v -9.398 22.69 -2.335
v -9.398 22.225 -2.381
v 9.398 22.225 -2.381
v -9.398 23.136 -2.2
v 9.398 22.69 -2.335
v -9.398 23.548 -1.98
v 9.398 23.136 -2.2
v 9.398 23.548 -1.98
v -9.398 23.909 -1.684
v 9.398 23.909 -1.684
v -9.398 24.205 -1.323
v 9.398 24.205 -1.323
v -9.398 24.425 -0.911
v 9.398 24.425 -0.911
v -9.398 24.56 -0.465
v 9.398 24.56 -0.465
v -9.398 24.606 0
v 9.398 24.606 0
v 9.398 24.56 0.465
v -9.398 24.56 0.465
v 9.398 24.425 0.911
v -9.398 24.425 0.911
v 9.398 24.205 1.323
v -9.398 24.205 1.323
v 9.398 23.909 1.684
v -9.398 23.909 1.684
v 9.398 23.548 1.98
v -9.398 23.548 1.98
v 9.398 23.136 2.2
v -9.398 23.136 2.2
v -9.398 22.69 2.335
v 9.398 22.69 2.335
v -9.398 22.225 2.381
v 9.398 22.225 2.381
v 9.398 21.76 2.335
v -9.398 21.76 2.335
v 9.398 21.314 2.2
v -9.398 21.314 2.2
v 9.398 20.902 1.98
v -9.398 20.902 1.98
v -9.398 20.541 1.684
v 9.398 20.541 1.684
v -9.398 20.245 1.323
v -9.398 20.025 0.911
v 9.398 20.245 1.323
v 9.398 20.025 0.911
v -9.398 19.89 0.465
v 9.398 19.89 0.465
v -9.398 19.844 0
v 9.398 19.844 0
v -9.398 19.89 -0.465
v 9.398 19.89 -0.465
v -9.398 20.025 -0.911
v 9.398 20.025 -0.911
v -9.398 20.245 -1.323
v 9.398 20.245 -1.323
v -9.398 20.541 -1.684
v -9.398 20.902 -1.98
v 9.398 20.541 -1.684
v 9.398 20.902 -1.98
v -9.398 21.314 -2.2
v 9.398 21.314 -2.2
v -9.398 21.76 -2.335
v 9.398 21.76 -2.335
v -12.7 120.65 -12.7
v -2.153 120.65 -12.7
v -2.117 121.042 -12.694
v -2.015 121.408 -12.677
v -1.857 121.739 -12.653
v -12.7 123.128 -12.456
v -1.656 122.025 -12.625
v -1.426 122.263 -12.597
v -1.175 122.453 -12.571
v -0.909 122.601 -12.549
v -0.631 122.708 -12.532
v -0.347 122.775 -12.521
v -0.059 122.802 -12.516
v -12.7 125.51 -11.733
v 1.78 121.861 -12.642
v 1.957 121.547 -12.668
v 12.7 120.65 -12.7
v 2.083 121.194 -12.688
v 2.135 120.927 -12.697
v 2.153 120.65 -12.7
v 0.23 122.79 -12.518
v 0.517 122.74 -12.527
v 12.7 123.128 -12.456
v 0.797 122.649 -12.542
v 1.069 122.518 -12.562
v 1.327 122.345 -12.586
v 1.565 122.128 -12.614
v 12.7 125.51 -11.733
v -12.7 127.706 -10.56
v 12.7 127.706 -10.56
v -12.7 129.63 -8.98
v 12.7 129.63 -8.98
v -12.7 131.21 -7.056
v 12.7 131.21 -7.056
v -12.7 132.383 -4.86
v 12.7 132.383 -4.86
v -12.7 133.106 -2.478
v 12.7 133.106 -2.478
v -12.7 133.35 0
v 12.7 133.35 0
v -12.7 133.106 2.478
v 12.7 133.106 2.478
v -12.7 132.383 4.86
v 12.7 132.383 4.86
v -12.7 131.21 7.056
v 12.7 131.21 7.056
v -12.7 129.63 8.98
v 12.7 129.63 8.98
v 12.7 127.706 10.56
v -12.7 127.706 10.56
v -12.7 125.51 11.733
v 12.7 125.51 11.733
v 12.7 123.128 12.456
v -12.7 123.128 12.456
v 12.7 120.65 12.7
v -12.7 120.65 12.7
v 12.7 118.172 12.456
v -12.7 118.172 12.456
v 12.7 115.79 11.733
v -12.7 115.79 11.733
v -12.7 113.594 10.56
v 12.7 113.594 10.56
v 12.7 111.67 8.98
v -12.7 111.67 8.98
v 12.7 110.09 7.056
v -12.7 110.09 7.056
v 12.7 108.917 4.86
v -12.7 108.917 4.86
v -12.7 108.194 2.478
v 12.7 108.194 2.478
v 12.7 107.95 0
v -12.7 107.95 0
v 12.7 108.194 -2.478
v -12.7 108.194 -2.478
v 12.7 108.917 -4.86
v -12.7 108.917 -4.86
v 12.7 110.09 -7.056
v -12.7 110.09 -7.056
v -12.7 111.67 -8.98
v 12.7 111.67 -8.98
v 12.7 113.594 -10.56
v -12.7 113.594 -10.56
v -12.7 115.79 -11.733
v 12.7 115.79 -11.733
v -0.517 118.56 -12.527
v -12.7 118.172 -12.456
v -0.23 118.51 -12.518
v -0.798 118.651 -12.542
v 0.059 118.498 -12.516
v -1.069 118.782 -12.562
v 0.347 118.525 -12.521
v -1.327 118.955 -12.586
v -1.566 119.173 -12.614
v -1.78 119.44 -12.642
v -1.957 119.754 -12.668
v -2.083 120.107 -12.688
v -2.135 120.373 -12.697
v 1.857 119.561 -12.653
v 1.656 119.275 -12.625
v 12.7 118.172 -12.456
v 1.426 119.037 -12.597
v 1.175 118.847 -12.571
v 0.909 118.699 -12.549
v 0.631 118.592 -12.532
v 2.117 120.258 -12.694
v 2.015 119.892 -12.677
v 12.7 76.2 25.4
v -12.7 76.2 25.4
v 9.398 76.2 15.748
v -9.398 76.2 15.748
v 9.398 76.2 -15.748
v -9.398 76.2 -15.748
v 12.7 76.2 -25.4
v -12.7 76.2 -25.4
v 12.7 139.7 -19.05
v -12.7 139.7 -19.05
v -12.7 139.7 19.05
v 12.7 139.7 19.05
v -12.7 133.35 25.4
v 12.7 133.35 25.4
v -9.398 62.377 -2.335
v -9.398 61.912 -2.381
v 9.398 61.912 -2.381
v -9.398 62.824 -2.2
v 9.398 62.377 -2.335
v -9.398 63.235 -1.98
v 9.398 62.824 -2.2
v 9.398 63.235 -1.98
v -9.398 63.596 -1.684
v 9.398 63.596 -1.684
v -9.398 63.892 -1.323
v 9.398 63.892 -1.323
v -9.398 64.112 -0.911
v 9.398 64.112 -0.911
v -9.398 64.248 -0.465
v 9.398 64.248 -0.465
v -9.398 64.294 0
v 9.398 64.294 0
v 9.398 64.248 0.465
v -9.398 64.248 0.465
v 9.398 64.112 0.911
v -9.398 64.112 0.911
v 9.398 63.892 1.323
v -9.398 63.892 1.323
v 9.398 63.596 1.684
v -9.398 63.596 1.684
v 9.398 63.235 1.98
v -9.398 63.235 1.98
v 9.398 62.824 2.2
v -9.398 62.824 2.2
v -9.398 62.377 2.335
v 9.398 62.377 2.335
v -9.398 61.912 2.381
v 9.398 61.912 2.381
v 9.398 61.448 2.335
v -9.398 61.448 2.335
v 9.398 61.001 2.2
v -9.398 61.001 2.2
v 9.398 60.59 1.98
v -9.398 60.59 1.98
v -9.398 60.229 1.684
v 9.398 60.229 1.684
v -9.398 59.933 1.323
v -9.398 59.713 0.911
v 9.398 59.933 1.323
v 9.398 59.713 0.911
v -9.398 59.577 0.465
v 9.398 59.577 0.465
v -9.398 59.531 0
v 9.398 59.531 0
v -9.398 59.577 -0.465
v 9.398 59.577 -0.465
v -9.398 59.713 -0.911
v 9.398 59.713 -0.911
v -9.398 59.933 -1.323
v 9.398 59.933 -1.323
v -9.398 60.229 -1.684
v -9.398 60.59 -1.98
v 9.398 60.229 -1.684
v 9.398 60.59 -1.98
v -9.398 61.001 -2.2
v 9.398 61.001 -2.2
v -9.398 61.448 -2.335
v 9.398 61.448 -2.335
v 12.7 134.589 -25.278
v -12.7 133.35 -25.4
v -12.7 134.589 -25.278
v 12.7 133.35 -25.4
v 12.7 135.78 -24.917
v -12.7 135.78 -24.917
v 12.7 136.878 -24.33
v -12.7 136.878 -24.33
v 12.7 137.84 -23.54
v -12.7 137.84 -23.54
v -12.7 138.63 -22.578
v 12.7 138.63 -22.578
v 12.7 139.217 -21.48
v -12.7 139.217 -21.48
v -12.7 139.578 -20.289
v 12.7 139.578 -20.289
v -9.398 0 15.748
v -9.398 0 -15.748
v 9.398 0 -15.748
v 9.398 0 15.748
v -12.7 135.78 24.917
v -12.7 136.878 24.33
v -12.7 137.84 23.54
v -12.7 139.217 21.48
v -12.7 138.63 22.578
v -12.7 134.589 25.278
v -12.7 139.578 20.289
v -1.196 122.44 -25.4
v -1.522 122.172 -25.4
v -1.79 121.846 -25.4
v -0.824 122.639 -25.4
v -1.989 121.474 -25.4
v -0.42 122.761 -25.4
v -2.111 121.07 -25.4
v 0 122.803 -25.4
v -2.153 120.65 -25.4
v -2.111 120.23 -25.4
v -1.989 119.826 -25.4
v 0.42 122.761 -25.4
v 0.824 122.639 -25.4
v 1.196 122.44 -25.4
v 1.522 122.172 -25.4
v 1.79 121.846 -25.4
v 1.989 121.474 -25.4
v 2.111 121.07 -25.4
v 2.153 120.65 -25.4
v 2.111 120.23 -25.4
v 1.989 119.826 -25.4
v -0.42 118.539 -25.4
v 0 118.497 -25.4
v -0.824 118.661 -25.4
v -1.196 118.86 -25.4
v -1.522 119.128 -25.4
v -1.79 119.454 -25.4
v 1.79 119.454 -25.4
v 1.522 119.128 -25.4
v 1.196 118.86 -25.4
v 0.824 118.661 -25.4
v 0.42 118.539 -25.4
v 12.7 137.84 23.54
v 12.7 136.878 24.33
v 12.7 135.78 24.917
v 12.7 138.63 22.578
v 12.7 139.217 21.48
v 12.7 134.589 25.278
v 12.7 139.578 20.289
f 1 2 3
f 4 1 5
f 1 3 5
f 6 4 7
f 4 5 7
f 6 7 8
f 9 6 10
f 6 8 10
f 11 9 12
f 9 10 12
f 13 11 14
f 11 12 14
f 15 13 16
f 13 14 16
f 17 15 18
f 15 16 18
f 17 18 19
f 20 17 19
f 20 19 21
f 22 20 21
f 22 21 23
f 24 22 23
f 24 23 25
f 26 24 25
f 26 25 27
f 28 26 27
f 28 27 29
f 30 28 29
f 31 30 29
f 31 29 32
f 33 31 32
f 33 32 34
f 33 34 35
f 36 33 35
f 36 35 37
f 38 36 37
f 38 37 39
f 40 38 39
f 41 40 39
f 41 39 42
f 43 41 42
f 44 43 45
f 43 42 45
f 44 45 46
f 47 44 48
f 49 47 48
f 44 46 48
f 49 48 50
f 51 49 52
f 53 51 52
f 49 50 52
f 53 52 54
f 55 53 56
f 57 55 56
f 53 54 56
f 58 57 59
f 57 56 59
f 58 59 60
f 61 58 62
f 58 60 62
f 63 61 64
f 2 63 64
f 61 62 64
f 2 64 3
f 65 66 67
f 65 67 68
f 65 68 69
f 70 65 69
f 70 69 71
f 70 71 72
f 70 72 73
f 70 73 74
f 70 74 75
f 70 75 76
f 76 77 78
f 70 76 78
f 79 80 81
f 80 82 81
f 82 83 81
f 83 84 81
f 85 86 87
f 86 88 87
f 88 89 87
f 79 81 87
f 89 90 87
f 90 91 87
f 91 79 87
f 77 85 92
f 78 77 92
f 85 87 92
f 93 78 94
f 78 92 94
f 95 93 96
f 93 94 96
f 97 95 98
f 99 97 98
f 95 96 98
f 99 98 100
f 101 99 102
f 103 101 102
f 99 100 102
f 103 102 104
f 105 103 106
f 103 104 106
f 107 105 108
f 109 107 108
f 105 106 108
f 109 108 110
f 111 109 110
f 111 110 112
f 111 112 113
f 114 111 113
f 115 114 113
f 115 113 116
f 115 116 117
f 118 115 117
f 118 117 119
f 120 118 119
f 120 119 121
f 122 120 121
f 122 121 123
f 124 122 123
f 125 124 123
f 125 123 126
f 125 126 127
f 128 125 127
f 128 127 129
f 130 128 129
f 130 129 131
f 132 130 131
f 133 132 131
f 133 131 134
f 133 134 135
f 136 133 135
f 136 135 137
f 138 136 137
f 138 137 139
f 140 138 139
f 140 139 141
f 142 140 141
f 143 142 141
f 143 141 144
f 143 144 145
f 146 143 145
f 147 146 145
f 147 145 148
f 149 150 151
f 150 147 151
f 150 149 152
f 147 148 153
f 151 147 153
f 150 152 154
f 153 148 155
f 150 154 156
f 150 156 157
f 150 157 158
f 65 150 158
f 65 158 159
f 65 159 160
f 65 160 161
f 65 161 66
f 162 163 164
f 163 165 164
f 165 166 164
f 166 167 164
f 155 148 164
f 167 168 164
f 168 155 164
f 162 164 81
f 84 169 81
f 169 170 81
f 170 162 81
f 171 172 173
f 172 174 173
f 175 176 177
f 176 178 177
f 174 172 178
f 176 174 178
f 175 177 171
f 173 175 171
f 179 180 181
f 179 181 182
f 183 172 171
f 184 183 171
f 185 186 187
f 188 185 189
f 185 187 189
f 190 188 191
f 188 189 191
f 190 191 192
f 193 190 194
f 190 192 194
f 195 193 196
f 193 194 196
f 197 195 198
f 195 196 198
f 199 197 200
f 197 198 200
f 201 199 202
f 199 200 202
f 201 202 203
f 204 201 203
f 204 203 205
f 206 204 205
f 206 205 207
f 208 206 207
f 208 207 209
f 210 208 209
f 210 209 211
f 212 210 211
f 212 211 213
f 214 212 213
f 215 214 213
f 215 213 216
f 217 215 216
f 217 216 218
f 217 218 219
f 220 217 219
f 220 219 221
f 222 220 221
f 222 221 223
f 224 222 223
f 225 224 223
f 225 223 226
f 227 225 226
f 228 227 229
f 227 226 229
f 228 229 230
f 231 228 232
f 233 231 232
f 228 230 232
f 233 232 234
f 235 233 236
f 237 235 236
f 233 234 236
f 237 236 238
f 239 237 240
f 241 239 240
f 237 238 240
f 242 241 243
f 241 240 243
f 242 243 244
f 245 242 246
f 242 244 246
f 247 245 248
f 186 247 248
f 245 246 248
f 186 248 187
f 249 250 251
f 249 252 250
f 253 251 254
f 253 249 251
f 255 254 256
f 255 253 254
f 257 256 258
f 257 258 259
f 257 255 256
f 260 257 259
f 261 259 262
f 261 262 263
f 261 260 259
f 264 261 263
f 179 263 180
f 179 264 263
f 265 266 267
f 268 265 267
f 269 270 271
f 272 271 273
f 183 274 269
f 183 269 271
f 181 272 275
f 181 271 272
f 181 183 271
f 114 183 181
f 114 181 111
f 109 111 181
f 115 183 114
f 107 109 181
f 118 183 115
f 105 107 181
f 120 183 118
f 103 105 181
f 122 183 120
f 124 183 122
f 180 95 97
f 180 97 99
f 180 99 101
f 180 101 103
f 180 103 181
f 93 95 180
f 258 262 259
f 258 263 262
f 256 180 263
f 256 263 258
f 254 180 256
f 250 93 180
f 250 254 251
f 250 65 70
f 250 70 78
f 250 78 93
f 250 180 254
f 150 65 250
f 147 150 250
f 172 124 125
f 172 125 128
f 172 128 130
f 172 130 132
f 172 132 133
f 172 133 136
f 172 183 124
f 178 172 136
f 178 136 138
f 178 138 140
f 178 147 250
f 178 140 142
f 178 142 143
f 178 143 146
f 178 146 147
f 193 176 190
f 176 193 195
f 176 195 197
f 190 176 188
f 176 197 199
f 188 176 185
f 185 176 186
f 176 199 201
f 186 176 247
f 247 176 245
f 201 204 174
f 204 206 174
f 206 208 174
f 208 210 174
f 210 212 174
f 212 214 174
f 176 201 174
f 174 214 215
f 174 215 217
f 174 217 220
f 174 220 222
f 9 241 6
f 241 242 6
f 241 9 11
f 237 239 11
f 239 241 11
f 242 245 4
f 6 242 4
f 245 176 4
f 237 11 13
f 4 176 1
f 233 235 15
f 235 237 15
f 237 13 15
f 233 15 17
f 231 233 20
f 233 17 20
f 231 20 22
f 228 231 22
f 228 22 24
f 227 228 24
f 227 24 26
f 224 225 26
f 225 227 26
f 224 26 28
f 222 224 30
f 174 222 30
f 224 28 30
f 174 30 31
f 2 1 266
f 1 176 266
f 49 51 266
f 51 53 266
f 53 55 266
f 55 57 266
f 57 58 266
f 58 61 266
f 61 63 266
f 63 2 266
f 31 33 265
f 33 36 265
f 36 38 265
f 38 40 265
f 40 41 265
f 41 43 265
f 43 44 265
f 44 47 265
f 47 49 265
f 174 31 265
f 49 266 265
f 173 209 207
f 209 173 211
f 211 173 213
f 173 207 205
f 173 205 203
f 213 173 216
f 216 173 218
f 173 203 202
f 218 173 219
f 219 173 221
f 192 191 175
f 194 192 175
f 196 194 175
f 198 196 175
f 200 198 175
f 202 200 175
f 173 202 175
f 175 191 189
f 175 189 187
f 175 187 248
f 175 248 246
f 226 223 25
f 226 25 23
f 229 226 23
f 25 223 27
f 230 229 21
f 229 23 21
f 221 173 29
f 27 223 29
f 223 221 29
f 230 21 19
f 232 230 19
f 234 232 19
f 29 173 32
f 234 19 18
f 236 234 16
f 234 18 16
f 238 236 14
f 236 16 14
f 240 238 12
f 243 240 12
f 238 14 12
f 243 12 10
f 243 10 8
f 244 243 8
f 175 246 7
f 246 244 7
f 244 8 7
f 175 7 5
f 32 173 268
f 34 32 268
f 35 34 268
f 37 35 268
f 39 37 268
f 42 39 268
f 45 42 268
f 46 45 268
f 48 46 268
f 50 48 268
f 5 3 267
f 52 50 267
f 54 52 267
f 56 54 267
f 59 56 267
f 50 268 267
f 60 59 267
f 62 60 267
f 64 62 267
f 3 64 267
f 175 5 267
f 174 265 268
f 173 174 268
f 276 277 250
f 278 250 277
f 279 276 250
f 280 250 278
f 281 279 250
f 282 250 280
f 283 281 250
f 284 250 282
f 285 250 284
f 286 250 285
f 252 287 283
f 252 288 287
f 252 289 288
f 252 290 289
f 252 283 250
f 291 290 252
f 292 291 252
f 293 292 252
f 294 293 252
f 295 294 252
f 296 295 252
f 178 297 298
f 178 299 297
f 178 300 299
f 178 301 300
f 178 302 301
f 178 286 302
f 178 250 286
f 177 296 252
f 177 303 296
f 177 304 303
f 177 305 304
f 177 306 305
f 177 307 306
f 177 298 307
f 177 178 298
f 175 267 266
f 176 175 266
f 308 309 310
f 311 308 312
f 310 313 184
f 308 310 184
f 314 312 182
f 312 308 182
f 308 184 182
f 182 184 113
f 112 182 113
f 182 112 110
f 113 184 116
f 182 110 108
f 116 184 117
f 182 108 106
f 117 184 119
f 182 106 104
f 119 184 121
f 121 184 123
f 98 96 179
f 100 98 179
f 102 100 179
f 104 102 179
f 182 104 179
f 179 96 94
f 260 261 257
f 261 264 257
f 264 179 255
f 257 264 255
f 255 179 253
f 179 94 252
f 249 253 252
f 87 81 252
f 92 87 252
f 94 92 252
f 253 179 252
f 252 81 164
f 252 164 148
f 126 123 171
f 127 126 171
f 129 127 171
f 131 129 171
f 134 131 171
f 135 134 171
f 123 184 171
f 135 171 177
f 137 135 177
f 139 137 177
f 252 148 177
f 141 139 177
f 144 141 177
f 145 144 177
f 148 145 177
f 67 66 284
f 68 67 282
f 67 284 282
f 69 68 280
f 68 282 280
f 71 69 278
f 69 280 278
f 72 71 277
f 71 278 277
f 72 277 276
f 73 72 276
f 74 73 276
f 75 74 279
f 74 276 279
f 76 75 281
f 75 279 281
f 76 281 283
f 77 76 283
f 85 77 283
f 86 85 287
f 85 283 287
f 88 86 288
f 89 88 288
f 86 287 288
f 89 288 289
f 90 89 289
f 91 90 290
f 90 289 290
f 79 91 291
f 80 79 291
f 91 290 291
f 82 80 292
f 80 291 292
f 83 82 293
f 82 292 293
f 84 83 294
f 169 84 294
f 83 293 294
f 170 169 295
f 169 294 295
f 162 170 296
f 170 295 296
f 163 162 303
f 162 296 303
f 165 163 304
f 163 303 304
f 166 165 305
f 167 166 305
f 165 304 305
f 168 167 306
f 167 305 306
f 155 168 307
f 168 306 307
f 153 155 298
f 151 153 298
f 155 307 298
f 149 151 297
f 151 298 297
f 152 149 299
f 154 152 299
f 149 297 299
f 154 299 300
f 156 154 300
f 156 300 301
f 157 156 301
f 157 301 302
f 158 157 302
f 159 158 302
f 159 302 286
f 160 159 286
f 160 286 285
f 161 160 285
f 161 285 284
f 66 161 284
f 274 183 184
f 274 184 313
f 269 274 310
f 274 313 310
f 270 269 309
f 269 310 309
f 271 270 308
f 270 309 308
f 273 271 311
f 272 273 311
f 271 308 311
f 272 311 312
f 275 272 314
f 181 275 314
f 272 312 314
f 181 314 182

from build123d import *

# Parameters (mm, degrees)
SKETCH2_W               = 20.828
SKETCH2_H               = 33.528
BOSS_EXTRUDE1_DEPTH     = 76.2
SKETCH3_W               = 25.4
SKETCH3_H               = 50.8
BOSS_EXTRUDE2_DEPTH     = 63.5
FILLET1_R               = 6.35
SKETCH4_R               = 12.7
CUT_EXTRUDE1_DEPTH      = 145.244271983
CUT_EXTRUDE2_REACH      = 151.191
CUT_EXTRUDE2_END_RADIUS = 12.7
SKETCH5_R               = 2.15265
SKETCH6_W               = 20.828
SKETCH6_H               = 33.528
CUT_EXTRUDE3_DEPTH      = 76.2
SKETCH7_R               = 2.38125
CUT_EXTRUDE4_DEPTH      = 78.74


with BuildPart() as part:
    # Sketch2 → Boss-Extrude1 (new body)
    with BuildSketch(Plane(origin=(0, 0, 0), x_dir=(1, 0, 0), z_dir=(0, 1, 0))):
        Rectangle(SKETCH2_W, SKETCH2_H)
    extrude(amount=BOSS_EXTRUDE1_DEPTH)

    # Sketch3 → Boss-Extrude2 (add)
    with BuildSketch(Plane(origin=(0, 76.2, 0), x_dir=(1, 0, 0), z_dir=(0, 1, 0))):
        Rectangle(SKETCH3_W, SKETCH3_H)
    extrude(amount=BOSS_EXTRUDE2_DEPTH)

    # Fillet1
    fillet1_edges = [part.edges().sort_by_distance(p)[0] for p in [
        (0, 139.7, -25.4),
        (0, 139.7, 25.4),
    ]]
    fillet(fillet1_edges, radius=FILLET1_R)

    # Sketch4 → Cut-Extrude1 (cut, through all)
    with BuildSketch(Plane(origin=(12.7, 0, 0), x_dir=(0, 0, -1), z_dir=(1, 0, 0))):
        with Locations((0, 120.65)):
            Circle(SKETCH4_R)
    extrude(amount=-CUT_EXTRUDE1_DEPTH, mode=Mode.SUBTRACT)

    # Cut-Extrude2: up to this cylinder (the profile starts outside it)
    cut_extrude2_end = Plane(origin=(0, 120.65, 0), z_dir=(1, 0, 0)) * Cylinder(CUT_EXTRUDE2_END_RADIUS, 328.782, mode=Mode.PRIVATE)
    # Sketch5 → Cut-Extrude2 (cut, up to the surface)
    with BuildSketch(Plane(origin=(0, 0, -25.4), x_dir=(-1, 0, 0), z_dir=(0, 0, -1)), mode=Mode.PRIVATE) as cut_extrude2_sk1:
        with Locations((0, 120.65)):
            Circle(SKETCH5_R)
    cut_extrude2_tool1 = extrude(cut_extrude2_sk1.sketch, amount=-CUT_EXTRUDE2_REACH, mode=Mode.PRIVATE) - cut_extrude2_end
    add(cut_extrude2_tool1.solids().sort_by_distance((0, 120.65, -25.4))[0], mode=Mode.SUBTRACT)

    # Sketch6 → Cut-Extrude3 (cut)
    with BuildSketch(Plane.XZ):
        Rectangle(SKETCH6_W, SKETCH6_H)
        Polygon((-9.398, -15.748), (-9.398, 15.748), (0, 15.748), (9.398, 15.748), (9.398, -15.748), align=None, mode=Mode.SUBTRACT)
    extrude(amount=-CUT_EXTRUDE3_DEPTH, mode=Mode.SUBTRACT)

    # Sketch7 → Cut-Extrude4 (cut)
    with BuildSketch(Plane(origin=(9.398, 0, 0), x_dir=(0, 0, -1), z_dir=(1, 0, 0))):
        with Locations((0, 61.9125)):
            Circle(SKETCH7_R)
        with Locations((0, 22.225)):
            Circle(SKETCH7_R)
    extrude(amount=-CUT_EXTRUDE4_DEPTH, mode=Mode.SUBTRACT)


solid = part.part
